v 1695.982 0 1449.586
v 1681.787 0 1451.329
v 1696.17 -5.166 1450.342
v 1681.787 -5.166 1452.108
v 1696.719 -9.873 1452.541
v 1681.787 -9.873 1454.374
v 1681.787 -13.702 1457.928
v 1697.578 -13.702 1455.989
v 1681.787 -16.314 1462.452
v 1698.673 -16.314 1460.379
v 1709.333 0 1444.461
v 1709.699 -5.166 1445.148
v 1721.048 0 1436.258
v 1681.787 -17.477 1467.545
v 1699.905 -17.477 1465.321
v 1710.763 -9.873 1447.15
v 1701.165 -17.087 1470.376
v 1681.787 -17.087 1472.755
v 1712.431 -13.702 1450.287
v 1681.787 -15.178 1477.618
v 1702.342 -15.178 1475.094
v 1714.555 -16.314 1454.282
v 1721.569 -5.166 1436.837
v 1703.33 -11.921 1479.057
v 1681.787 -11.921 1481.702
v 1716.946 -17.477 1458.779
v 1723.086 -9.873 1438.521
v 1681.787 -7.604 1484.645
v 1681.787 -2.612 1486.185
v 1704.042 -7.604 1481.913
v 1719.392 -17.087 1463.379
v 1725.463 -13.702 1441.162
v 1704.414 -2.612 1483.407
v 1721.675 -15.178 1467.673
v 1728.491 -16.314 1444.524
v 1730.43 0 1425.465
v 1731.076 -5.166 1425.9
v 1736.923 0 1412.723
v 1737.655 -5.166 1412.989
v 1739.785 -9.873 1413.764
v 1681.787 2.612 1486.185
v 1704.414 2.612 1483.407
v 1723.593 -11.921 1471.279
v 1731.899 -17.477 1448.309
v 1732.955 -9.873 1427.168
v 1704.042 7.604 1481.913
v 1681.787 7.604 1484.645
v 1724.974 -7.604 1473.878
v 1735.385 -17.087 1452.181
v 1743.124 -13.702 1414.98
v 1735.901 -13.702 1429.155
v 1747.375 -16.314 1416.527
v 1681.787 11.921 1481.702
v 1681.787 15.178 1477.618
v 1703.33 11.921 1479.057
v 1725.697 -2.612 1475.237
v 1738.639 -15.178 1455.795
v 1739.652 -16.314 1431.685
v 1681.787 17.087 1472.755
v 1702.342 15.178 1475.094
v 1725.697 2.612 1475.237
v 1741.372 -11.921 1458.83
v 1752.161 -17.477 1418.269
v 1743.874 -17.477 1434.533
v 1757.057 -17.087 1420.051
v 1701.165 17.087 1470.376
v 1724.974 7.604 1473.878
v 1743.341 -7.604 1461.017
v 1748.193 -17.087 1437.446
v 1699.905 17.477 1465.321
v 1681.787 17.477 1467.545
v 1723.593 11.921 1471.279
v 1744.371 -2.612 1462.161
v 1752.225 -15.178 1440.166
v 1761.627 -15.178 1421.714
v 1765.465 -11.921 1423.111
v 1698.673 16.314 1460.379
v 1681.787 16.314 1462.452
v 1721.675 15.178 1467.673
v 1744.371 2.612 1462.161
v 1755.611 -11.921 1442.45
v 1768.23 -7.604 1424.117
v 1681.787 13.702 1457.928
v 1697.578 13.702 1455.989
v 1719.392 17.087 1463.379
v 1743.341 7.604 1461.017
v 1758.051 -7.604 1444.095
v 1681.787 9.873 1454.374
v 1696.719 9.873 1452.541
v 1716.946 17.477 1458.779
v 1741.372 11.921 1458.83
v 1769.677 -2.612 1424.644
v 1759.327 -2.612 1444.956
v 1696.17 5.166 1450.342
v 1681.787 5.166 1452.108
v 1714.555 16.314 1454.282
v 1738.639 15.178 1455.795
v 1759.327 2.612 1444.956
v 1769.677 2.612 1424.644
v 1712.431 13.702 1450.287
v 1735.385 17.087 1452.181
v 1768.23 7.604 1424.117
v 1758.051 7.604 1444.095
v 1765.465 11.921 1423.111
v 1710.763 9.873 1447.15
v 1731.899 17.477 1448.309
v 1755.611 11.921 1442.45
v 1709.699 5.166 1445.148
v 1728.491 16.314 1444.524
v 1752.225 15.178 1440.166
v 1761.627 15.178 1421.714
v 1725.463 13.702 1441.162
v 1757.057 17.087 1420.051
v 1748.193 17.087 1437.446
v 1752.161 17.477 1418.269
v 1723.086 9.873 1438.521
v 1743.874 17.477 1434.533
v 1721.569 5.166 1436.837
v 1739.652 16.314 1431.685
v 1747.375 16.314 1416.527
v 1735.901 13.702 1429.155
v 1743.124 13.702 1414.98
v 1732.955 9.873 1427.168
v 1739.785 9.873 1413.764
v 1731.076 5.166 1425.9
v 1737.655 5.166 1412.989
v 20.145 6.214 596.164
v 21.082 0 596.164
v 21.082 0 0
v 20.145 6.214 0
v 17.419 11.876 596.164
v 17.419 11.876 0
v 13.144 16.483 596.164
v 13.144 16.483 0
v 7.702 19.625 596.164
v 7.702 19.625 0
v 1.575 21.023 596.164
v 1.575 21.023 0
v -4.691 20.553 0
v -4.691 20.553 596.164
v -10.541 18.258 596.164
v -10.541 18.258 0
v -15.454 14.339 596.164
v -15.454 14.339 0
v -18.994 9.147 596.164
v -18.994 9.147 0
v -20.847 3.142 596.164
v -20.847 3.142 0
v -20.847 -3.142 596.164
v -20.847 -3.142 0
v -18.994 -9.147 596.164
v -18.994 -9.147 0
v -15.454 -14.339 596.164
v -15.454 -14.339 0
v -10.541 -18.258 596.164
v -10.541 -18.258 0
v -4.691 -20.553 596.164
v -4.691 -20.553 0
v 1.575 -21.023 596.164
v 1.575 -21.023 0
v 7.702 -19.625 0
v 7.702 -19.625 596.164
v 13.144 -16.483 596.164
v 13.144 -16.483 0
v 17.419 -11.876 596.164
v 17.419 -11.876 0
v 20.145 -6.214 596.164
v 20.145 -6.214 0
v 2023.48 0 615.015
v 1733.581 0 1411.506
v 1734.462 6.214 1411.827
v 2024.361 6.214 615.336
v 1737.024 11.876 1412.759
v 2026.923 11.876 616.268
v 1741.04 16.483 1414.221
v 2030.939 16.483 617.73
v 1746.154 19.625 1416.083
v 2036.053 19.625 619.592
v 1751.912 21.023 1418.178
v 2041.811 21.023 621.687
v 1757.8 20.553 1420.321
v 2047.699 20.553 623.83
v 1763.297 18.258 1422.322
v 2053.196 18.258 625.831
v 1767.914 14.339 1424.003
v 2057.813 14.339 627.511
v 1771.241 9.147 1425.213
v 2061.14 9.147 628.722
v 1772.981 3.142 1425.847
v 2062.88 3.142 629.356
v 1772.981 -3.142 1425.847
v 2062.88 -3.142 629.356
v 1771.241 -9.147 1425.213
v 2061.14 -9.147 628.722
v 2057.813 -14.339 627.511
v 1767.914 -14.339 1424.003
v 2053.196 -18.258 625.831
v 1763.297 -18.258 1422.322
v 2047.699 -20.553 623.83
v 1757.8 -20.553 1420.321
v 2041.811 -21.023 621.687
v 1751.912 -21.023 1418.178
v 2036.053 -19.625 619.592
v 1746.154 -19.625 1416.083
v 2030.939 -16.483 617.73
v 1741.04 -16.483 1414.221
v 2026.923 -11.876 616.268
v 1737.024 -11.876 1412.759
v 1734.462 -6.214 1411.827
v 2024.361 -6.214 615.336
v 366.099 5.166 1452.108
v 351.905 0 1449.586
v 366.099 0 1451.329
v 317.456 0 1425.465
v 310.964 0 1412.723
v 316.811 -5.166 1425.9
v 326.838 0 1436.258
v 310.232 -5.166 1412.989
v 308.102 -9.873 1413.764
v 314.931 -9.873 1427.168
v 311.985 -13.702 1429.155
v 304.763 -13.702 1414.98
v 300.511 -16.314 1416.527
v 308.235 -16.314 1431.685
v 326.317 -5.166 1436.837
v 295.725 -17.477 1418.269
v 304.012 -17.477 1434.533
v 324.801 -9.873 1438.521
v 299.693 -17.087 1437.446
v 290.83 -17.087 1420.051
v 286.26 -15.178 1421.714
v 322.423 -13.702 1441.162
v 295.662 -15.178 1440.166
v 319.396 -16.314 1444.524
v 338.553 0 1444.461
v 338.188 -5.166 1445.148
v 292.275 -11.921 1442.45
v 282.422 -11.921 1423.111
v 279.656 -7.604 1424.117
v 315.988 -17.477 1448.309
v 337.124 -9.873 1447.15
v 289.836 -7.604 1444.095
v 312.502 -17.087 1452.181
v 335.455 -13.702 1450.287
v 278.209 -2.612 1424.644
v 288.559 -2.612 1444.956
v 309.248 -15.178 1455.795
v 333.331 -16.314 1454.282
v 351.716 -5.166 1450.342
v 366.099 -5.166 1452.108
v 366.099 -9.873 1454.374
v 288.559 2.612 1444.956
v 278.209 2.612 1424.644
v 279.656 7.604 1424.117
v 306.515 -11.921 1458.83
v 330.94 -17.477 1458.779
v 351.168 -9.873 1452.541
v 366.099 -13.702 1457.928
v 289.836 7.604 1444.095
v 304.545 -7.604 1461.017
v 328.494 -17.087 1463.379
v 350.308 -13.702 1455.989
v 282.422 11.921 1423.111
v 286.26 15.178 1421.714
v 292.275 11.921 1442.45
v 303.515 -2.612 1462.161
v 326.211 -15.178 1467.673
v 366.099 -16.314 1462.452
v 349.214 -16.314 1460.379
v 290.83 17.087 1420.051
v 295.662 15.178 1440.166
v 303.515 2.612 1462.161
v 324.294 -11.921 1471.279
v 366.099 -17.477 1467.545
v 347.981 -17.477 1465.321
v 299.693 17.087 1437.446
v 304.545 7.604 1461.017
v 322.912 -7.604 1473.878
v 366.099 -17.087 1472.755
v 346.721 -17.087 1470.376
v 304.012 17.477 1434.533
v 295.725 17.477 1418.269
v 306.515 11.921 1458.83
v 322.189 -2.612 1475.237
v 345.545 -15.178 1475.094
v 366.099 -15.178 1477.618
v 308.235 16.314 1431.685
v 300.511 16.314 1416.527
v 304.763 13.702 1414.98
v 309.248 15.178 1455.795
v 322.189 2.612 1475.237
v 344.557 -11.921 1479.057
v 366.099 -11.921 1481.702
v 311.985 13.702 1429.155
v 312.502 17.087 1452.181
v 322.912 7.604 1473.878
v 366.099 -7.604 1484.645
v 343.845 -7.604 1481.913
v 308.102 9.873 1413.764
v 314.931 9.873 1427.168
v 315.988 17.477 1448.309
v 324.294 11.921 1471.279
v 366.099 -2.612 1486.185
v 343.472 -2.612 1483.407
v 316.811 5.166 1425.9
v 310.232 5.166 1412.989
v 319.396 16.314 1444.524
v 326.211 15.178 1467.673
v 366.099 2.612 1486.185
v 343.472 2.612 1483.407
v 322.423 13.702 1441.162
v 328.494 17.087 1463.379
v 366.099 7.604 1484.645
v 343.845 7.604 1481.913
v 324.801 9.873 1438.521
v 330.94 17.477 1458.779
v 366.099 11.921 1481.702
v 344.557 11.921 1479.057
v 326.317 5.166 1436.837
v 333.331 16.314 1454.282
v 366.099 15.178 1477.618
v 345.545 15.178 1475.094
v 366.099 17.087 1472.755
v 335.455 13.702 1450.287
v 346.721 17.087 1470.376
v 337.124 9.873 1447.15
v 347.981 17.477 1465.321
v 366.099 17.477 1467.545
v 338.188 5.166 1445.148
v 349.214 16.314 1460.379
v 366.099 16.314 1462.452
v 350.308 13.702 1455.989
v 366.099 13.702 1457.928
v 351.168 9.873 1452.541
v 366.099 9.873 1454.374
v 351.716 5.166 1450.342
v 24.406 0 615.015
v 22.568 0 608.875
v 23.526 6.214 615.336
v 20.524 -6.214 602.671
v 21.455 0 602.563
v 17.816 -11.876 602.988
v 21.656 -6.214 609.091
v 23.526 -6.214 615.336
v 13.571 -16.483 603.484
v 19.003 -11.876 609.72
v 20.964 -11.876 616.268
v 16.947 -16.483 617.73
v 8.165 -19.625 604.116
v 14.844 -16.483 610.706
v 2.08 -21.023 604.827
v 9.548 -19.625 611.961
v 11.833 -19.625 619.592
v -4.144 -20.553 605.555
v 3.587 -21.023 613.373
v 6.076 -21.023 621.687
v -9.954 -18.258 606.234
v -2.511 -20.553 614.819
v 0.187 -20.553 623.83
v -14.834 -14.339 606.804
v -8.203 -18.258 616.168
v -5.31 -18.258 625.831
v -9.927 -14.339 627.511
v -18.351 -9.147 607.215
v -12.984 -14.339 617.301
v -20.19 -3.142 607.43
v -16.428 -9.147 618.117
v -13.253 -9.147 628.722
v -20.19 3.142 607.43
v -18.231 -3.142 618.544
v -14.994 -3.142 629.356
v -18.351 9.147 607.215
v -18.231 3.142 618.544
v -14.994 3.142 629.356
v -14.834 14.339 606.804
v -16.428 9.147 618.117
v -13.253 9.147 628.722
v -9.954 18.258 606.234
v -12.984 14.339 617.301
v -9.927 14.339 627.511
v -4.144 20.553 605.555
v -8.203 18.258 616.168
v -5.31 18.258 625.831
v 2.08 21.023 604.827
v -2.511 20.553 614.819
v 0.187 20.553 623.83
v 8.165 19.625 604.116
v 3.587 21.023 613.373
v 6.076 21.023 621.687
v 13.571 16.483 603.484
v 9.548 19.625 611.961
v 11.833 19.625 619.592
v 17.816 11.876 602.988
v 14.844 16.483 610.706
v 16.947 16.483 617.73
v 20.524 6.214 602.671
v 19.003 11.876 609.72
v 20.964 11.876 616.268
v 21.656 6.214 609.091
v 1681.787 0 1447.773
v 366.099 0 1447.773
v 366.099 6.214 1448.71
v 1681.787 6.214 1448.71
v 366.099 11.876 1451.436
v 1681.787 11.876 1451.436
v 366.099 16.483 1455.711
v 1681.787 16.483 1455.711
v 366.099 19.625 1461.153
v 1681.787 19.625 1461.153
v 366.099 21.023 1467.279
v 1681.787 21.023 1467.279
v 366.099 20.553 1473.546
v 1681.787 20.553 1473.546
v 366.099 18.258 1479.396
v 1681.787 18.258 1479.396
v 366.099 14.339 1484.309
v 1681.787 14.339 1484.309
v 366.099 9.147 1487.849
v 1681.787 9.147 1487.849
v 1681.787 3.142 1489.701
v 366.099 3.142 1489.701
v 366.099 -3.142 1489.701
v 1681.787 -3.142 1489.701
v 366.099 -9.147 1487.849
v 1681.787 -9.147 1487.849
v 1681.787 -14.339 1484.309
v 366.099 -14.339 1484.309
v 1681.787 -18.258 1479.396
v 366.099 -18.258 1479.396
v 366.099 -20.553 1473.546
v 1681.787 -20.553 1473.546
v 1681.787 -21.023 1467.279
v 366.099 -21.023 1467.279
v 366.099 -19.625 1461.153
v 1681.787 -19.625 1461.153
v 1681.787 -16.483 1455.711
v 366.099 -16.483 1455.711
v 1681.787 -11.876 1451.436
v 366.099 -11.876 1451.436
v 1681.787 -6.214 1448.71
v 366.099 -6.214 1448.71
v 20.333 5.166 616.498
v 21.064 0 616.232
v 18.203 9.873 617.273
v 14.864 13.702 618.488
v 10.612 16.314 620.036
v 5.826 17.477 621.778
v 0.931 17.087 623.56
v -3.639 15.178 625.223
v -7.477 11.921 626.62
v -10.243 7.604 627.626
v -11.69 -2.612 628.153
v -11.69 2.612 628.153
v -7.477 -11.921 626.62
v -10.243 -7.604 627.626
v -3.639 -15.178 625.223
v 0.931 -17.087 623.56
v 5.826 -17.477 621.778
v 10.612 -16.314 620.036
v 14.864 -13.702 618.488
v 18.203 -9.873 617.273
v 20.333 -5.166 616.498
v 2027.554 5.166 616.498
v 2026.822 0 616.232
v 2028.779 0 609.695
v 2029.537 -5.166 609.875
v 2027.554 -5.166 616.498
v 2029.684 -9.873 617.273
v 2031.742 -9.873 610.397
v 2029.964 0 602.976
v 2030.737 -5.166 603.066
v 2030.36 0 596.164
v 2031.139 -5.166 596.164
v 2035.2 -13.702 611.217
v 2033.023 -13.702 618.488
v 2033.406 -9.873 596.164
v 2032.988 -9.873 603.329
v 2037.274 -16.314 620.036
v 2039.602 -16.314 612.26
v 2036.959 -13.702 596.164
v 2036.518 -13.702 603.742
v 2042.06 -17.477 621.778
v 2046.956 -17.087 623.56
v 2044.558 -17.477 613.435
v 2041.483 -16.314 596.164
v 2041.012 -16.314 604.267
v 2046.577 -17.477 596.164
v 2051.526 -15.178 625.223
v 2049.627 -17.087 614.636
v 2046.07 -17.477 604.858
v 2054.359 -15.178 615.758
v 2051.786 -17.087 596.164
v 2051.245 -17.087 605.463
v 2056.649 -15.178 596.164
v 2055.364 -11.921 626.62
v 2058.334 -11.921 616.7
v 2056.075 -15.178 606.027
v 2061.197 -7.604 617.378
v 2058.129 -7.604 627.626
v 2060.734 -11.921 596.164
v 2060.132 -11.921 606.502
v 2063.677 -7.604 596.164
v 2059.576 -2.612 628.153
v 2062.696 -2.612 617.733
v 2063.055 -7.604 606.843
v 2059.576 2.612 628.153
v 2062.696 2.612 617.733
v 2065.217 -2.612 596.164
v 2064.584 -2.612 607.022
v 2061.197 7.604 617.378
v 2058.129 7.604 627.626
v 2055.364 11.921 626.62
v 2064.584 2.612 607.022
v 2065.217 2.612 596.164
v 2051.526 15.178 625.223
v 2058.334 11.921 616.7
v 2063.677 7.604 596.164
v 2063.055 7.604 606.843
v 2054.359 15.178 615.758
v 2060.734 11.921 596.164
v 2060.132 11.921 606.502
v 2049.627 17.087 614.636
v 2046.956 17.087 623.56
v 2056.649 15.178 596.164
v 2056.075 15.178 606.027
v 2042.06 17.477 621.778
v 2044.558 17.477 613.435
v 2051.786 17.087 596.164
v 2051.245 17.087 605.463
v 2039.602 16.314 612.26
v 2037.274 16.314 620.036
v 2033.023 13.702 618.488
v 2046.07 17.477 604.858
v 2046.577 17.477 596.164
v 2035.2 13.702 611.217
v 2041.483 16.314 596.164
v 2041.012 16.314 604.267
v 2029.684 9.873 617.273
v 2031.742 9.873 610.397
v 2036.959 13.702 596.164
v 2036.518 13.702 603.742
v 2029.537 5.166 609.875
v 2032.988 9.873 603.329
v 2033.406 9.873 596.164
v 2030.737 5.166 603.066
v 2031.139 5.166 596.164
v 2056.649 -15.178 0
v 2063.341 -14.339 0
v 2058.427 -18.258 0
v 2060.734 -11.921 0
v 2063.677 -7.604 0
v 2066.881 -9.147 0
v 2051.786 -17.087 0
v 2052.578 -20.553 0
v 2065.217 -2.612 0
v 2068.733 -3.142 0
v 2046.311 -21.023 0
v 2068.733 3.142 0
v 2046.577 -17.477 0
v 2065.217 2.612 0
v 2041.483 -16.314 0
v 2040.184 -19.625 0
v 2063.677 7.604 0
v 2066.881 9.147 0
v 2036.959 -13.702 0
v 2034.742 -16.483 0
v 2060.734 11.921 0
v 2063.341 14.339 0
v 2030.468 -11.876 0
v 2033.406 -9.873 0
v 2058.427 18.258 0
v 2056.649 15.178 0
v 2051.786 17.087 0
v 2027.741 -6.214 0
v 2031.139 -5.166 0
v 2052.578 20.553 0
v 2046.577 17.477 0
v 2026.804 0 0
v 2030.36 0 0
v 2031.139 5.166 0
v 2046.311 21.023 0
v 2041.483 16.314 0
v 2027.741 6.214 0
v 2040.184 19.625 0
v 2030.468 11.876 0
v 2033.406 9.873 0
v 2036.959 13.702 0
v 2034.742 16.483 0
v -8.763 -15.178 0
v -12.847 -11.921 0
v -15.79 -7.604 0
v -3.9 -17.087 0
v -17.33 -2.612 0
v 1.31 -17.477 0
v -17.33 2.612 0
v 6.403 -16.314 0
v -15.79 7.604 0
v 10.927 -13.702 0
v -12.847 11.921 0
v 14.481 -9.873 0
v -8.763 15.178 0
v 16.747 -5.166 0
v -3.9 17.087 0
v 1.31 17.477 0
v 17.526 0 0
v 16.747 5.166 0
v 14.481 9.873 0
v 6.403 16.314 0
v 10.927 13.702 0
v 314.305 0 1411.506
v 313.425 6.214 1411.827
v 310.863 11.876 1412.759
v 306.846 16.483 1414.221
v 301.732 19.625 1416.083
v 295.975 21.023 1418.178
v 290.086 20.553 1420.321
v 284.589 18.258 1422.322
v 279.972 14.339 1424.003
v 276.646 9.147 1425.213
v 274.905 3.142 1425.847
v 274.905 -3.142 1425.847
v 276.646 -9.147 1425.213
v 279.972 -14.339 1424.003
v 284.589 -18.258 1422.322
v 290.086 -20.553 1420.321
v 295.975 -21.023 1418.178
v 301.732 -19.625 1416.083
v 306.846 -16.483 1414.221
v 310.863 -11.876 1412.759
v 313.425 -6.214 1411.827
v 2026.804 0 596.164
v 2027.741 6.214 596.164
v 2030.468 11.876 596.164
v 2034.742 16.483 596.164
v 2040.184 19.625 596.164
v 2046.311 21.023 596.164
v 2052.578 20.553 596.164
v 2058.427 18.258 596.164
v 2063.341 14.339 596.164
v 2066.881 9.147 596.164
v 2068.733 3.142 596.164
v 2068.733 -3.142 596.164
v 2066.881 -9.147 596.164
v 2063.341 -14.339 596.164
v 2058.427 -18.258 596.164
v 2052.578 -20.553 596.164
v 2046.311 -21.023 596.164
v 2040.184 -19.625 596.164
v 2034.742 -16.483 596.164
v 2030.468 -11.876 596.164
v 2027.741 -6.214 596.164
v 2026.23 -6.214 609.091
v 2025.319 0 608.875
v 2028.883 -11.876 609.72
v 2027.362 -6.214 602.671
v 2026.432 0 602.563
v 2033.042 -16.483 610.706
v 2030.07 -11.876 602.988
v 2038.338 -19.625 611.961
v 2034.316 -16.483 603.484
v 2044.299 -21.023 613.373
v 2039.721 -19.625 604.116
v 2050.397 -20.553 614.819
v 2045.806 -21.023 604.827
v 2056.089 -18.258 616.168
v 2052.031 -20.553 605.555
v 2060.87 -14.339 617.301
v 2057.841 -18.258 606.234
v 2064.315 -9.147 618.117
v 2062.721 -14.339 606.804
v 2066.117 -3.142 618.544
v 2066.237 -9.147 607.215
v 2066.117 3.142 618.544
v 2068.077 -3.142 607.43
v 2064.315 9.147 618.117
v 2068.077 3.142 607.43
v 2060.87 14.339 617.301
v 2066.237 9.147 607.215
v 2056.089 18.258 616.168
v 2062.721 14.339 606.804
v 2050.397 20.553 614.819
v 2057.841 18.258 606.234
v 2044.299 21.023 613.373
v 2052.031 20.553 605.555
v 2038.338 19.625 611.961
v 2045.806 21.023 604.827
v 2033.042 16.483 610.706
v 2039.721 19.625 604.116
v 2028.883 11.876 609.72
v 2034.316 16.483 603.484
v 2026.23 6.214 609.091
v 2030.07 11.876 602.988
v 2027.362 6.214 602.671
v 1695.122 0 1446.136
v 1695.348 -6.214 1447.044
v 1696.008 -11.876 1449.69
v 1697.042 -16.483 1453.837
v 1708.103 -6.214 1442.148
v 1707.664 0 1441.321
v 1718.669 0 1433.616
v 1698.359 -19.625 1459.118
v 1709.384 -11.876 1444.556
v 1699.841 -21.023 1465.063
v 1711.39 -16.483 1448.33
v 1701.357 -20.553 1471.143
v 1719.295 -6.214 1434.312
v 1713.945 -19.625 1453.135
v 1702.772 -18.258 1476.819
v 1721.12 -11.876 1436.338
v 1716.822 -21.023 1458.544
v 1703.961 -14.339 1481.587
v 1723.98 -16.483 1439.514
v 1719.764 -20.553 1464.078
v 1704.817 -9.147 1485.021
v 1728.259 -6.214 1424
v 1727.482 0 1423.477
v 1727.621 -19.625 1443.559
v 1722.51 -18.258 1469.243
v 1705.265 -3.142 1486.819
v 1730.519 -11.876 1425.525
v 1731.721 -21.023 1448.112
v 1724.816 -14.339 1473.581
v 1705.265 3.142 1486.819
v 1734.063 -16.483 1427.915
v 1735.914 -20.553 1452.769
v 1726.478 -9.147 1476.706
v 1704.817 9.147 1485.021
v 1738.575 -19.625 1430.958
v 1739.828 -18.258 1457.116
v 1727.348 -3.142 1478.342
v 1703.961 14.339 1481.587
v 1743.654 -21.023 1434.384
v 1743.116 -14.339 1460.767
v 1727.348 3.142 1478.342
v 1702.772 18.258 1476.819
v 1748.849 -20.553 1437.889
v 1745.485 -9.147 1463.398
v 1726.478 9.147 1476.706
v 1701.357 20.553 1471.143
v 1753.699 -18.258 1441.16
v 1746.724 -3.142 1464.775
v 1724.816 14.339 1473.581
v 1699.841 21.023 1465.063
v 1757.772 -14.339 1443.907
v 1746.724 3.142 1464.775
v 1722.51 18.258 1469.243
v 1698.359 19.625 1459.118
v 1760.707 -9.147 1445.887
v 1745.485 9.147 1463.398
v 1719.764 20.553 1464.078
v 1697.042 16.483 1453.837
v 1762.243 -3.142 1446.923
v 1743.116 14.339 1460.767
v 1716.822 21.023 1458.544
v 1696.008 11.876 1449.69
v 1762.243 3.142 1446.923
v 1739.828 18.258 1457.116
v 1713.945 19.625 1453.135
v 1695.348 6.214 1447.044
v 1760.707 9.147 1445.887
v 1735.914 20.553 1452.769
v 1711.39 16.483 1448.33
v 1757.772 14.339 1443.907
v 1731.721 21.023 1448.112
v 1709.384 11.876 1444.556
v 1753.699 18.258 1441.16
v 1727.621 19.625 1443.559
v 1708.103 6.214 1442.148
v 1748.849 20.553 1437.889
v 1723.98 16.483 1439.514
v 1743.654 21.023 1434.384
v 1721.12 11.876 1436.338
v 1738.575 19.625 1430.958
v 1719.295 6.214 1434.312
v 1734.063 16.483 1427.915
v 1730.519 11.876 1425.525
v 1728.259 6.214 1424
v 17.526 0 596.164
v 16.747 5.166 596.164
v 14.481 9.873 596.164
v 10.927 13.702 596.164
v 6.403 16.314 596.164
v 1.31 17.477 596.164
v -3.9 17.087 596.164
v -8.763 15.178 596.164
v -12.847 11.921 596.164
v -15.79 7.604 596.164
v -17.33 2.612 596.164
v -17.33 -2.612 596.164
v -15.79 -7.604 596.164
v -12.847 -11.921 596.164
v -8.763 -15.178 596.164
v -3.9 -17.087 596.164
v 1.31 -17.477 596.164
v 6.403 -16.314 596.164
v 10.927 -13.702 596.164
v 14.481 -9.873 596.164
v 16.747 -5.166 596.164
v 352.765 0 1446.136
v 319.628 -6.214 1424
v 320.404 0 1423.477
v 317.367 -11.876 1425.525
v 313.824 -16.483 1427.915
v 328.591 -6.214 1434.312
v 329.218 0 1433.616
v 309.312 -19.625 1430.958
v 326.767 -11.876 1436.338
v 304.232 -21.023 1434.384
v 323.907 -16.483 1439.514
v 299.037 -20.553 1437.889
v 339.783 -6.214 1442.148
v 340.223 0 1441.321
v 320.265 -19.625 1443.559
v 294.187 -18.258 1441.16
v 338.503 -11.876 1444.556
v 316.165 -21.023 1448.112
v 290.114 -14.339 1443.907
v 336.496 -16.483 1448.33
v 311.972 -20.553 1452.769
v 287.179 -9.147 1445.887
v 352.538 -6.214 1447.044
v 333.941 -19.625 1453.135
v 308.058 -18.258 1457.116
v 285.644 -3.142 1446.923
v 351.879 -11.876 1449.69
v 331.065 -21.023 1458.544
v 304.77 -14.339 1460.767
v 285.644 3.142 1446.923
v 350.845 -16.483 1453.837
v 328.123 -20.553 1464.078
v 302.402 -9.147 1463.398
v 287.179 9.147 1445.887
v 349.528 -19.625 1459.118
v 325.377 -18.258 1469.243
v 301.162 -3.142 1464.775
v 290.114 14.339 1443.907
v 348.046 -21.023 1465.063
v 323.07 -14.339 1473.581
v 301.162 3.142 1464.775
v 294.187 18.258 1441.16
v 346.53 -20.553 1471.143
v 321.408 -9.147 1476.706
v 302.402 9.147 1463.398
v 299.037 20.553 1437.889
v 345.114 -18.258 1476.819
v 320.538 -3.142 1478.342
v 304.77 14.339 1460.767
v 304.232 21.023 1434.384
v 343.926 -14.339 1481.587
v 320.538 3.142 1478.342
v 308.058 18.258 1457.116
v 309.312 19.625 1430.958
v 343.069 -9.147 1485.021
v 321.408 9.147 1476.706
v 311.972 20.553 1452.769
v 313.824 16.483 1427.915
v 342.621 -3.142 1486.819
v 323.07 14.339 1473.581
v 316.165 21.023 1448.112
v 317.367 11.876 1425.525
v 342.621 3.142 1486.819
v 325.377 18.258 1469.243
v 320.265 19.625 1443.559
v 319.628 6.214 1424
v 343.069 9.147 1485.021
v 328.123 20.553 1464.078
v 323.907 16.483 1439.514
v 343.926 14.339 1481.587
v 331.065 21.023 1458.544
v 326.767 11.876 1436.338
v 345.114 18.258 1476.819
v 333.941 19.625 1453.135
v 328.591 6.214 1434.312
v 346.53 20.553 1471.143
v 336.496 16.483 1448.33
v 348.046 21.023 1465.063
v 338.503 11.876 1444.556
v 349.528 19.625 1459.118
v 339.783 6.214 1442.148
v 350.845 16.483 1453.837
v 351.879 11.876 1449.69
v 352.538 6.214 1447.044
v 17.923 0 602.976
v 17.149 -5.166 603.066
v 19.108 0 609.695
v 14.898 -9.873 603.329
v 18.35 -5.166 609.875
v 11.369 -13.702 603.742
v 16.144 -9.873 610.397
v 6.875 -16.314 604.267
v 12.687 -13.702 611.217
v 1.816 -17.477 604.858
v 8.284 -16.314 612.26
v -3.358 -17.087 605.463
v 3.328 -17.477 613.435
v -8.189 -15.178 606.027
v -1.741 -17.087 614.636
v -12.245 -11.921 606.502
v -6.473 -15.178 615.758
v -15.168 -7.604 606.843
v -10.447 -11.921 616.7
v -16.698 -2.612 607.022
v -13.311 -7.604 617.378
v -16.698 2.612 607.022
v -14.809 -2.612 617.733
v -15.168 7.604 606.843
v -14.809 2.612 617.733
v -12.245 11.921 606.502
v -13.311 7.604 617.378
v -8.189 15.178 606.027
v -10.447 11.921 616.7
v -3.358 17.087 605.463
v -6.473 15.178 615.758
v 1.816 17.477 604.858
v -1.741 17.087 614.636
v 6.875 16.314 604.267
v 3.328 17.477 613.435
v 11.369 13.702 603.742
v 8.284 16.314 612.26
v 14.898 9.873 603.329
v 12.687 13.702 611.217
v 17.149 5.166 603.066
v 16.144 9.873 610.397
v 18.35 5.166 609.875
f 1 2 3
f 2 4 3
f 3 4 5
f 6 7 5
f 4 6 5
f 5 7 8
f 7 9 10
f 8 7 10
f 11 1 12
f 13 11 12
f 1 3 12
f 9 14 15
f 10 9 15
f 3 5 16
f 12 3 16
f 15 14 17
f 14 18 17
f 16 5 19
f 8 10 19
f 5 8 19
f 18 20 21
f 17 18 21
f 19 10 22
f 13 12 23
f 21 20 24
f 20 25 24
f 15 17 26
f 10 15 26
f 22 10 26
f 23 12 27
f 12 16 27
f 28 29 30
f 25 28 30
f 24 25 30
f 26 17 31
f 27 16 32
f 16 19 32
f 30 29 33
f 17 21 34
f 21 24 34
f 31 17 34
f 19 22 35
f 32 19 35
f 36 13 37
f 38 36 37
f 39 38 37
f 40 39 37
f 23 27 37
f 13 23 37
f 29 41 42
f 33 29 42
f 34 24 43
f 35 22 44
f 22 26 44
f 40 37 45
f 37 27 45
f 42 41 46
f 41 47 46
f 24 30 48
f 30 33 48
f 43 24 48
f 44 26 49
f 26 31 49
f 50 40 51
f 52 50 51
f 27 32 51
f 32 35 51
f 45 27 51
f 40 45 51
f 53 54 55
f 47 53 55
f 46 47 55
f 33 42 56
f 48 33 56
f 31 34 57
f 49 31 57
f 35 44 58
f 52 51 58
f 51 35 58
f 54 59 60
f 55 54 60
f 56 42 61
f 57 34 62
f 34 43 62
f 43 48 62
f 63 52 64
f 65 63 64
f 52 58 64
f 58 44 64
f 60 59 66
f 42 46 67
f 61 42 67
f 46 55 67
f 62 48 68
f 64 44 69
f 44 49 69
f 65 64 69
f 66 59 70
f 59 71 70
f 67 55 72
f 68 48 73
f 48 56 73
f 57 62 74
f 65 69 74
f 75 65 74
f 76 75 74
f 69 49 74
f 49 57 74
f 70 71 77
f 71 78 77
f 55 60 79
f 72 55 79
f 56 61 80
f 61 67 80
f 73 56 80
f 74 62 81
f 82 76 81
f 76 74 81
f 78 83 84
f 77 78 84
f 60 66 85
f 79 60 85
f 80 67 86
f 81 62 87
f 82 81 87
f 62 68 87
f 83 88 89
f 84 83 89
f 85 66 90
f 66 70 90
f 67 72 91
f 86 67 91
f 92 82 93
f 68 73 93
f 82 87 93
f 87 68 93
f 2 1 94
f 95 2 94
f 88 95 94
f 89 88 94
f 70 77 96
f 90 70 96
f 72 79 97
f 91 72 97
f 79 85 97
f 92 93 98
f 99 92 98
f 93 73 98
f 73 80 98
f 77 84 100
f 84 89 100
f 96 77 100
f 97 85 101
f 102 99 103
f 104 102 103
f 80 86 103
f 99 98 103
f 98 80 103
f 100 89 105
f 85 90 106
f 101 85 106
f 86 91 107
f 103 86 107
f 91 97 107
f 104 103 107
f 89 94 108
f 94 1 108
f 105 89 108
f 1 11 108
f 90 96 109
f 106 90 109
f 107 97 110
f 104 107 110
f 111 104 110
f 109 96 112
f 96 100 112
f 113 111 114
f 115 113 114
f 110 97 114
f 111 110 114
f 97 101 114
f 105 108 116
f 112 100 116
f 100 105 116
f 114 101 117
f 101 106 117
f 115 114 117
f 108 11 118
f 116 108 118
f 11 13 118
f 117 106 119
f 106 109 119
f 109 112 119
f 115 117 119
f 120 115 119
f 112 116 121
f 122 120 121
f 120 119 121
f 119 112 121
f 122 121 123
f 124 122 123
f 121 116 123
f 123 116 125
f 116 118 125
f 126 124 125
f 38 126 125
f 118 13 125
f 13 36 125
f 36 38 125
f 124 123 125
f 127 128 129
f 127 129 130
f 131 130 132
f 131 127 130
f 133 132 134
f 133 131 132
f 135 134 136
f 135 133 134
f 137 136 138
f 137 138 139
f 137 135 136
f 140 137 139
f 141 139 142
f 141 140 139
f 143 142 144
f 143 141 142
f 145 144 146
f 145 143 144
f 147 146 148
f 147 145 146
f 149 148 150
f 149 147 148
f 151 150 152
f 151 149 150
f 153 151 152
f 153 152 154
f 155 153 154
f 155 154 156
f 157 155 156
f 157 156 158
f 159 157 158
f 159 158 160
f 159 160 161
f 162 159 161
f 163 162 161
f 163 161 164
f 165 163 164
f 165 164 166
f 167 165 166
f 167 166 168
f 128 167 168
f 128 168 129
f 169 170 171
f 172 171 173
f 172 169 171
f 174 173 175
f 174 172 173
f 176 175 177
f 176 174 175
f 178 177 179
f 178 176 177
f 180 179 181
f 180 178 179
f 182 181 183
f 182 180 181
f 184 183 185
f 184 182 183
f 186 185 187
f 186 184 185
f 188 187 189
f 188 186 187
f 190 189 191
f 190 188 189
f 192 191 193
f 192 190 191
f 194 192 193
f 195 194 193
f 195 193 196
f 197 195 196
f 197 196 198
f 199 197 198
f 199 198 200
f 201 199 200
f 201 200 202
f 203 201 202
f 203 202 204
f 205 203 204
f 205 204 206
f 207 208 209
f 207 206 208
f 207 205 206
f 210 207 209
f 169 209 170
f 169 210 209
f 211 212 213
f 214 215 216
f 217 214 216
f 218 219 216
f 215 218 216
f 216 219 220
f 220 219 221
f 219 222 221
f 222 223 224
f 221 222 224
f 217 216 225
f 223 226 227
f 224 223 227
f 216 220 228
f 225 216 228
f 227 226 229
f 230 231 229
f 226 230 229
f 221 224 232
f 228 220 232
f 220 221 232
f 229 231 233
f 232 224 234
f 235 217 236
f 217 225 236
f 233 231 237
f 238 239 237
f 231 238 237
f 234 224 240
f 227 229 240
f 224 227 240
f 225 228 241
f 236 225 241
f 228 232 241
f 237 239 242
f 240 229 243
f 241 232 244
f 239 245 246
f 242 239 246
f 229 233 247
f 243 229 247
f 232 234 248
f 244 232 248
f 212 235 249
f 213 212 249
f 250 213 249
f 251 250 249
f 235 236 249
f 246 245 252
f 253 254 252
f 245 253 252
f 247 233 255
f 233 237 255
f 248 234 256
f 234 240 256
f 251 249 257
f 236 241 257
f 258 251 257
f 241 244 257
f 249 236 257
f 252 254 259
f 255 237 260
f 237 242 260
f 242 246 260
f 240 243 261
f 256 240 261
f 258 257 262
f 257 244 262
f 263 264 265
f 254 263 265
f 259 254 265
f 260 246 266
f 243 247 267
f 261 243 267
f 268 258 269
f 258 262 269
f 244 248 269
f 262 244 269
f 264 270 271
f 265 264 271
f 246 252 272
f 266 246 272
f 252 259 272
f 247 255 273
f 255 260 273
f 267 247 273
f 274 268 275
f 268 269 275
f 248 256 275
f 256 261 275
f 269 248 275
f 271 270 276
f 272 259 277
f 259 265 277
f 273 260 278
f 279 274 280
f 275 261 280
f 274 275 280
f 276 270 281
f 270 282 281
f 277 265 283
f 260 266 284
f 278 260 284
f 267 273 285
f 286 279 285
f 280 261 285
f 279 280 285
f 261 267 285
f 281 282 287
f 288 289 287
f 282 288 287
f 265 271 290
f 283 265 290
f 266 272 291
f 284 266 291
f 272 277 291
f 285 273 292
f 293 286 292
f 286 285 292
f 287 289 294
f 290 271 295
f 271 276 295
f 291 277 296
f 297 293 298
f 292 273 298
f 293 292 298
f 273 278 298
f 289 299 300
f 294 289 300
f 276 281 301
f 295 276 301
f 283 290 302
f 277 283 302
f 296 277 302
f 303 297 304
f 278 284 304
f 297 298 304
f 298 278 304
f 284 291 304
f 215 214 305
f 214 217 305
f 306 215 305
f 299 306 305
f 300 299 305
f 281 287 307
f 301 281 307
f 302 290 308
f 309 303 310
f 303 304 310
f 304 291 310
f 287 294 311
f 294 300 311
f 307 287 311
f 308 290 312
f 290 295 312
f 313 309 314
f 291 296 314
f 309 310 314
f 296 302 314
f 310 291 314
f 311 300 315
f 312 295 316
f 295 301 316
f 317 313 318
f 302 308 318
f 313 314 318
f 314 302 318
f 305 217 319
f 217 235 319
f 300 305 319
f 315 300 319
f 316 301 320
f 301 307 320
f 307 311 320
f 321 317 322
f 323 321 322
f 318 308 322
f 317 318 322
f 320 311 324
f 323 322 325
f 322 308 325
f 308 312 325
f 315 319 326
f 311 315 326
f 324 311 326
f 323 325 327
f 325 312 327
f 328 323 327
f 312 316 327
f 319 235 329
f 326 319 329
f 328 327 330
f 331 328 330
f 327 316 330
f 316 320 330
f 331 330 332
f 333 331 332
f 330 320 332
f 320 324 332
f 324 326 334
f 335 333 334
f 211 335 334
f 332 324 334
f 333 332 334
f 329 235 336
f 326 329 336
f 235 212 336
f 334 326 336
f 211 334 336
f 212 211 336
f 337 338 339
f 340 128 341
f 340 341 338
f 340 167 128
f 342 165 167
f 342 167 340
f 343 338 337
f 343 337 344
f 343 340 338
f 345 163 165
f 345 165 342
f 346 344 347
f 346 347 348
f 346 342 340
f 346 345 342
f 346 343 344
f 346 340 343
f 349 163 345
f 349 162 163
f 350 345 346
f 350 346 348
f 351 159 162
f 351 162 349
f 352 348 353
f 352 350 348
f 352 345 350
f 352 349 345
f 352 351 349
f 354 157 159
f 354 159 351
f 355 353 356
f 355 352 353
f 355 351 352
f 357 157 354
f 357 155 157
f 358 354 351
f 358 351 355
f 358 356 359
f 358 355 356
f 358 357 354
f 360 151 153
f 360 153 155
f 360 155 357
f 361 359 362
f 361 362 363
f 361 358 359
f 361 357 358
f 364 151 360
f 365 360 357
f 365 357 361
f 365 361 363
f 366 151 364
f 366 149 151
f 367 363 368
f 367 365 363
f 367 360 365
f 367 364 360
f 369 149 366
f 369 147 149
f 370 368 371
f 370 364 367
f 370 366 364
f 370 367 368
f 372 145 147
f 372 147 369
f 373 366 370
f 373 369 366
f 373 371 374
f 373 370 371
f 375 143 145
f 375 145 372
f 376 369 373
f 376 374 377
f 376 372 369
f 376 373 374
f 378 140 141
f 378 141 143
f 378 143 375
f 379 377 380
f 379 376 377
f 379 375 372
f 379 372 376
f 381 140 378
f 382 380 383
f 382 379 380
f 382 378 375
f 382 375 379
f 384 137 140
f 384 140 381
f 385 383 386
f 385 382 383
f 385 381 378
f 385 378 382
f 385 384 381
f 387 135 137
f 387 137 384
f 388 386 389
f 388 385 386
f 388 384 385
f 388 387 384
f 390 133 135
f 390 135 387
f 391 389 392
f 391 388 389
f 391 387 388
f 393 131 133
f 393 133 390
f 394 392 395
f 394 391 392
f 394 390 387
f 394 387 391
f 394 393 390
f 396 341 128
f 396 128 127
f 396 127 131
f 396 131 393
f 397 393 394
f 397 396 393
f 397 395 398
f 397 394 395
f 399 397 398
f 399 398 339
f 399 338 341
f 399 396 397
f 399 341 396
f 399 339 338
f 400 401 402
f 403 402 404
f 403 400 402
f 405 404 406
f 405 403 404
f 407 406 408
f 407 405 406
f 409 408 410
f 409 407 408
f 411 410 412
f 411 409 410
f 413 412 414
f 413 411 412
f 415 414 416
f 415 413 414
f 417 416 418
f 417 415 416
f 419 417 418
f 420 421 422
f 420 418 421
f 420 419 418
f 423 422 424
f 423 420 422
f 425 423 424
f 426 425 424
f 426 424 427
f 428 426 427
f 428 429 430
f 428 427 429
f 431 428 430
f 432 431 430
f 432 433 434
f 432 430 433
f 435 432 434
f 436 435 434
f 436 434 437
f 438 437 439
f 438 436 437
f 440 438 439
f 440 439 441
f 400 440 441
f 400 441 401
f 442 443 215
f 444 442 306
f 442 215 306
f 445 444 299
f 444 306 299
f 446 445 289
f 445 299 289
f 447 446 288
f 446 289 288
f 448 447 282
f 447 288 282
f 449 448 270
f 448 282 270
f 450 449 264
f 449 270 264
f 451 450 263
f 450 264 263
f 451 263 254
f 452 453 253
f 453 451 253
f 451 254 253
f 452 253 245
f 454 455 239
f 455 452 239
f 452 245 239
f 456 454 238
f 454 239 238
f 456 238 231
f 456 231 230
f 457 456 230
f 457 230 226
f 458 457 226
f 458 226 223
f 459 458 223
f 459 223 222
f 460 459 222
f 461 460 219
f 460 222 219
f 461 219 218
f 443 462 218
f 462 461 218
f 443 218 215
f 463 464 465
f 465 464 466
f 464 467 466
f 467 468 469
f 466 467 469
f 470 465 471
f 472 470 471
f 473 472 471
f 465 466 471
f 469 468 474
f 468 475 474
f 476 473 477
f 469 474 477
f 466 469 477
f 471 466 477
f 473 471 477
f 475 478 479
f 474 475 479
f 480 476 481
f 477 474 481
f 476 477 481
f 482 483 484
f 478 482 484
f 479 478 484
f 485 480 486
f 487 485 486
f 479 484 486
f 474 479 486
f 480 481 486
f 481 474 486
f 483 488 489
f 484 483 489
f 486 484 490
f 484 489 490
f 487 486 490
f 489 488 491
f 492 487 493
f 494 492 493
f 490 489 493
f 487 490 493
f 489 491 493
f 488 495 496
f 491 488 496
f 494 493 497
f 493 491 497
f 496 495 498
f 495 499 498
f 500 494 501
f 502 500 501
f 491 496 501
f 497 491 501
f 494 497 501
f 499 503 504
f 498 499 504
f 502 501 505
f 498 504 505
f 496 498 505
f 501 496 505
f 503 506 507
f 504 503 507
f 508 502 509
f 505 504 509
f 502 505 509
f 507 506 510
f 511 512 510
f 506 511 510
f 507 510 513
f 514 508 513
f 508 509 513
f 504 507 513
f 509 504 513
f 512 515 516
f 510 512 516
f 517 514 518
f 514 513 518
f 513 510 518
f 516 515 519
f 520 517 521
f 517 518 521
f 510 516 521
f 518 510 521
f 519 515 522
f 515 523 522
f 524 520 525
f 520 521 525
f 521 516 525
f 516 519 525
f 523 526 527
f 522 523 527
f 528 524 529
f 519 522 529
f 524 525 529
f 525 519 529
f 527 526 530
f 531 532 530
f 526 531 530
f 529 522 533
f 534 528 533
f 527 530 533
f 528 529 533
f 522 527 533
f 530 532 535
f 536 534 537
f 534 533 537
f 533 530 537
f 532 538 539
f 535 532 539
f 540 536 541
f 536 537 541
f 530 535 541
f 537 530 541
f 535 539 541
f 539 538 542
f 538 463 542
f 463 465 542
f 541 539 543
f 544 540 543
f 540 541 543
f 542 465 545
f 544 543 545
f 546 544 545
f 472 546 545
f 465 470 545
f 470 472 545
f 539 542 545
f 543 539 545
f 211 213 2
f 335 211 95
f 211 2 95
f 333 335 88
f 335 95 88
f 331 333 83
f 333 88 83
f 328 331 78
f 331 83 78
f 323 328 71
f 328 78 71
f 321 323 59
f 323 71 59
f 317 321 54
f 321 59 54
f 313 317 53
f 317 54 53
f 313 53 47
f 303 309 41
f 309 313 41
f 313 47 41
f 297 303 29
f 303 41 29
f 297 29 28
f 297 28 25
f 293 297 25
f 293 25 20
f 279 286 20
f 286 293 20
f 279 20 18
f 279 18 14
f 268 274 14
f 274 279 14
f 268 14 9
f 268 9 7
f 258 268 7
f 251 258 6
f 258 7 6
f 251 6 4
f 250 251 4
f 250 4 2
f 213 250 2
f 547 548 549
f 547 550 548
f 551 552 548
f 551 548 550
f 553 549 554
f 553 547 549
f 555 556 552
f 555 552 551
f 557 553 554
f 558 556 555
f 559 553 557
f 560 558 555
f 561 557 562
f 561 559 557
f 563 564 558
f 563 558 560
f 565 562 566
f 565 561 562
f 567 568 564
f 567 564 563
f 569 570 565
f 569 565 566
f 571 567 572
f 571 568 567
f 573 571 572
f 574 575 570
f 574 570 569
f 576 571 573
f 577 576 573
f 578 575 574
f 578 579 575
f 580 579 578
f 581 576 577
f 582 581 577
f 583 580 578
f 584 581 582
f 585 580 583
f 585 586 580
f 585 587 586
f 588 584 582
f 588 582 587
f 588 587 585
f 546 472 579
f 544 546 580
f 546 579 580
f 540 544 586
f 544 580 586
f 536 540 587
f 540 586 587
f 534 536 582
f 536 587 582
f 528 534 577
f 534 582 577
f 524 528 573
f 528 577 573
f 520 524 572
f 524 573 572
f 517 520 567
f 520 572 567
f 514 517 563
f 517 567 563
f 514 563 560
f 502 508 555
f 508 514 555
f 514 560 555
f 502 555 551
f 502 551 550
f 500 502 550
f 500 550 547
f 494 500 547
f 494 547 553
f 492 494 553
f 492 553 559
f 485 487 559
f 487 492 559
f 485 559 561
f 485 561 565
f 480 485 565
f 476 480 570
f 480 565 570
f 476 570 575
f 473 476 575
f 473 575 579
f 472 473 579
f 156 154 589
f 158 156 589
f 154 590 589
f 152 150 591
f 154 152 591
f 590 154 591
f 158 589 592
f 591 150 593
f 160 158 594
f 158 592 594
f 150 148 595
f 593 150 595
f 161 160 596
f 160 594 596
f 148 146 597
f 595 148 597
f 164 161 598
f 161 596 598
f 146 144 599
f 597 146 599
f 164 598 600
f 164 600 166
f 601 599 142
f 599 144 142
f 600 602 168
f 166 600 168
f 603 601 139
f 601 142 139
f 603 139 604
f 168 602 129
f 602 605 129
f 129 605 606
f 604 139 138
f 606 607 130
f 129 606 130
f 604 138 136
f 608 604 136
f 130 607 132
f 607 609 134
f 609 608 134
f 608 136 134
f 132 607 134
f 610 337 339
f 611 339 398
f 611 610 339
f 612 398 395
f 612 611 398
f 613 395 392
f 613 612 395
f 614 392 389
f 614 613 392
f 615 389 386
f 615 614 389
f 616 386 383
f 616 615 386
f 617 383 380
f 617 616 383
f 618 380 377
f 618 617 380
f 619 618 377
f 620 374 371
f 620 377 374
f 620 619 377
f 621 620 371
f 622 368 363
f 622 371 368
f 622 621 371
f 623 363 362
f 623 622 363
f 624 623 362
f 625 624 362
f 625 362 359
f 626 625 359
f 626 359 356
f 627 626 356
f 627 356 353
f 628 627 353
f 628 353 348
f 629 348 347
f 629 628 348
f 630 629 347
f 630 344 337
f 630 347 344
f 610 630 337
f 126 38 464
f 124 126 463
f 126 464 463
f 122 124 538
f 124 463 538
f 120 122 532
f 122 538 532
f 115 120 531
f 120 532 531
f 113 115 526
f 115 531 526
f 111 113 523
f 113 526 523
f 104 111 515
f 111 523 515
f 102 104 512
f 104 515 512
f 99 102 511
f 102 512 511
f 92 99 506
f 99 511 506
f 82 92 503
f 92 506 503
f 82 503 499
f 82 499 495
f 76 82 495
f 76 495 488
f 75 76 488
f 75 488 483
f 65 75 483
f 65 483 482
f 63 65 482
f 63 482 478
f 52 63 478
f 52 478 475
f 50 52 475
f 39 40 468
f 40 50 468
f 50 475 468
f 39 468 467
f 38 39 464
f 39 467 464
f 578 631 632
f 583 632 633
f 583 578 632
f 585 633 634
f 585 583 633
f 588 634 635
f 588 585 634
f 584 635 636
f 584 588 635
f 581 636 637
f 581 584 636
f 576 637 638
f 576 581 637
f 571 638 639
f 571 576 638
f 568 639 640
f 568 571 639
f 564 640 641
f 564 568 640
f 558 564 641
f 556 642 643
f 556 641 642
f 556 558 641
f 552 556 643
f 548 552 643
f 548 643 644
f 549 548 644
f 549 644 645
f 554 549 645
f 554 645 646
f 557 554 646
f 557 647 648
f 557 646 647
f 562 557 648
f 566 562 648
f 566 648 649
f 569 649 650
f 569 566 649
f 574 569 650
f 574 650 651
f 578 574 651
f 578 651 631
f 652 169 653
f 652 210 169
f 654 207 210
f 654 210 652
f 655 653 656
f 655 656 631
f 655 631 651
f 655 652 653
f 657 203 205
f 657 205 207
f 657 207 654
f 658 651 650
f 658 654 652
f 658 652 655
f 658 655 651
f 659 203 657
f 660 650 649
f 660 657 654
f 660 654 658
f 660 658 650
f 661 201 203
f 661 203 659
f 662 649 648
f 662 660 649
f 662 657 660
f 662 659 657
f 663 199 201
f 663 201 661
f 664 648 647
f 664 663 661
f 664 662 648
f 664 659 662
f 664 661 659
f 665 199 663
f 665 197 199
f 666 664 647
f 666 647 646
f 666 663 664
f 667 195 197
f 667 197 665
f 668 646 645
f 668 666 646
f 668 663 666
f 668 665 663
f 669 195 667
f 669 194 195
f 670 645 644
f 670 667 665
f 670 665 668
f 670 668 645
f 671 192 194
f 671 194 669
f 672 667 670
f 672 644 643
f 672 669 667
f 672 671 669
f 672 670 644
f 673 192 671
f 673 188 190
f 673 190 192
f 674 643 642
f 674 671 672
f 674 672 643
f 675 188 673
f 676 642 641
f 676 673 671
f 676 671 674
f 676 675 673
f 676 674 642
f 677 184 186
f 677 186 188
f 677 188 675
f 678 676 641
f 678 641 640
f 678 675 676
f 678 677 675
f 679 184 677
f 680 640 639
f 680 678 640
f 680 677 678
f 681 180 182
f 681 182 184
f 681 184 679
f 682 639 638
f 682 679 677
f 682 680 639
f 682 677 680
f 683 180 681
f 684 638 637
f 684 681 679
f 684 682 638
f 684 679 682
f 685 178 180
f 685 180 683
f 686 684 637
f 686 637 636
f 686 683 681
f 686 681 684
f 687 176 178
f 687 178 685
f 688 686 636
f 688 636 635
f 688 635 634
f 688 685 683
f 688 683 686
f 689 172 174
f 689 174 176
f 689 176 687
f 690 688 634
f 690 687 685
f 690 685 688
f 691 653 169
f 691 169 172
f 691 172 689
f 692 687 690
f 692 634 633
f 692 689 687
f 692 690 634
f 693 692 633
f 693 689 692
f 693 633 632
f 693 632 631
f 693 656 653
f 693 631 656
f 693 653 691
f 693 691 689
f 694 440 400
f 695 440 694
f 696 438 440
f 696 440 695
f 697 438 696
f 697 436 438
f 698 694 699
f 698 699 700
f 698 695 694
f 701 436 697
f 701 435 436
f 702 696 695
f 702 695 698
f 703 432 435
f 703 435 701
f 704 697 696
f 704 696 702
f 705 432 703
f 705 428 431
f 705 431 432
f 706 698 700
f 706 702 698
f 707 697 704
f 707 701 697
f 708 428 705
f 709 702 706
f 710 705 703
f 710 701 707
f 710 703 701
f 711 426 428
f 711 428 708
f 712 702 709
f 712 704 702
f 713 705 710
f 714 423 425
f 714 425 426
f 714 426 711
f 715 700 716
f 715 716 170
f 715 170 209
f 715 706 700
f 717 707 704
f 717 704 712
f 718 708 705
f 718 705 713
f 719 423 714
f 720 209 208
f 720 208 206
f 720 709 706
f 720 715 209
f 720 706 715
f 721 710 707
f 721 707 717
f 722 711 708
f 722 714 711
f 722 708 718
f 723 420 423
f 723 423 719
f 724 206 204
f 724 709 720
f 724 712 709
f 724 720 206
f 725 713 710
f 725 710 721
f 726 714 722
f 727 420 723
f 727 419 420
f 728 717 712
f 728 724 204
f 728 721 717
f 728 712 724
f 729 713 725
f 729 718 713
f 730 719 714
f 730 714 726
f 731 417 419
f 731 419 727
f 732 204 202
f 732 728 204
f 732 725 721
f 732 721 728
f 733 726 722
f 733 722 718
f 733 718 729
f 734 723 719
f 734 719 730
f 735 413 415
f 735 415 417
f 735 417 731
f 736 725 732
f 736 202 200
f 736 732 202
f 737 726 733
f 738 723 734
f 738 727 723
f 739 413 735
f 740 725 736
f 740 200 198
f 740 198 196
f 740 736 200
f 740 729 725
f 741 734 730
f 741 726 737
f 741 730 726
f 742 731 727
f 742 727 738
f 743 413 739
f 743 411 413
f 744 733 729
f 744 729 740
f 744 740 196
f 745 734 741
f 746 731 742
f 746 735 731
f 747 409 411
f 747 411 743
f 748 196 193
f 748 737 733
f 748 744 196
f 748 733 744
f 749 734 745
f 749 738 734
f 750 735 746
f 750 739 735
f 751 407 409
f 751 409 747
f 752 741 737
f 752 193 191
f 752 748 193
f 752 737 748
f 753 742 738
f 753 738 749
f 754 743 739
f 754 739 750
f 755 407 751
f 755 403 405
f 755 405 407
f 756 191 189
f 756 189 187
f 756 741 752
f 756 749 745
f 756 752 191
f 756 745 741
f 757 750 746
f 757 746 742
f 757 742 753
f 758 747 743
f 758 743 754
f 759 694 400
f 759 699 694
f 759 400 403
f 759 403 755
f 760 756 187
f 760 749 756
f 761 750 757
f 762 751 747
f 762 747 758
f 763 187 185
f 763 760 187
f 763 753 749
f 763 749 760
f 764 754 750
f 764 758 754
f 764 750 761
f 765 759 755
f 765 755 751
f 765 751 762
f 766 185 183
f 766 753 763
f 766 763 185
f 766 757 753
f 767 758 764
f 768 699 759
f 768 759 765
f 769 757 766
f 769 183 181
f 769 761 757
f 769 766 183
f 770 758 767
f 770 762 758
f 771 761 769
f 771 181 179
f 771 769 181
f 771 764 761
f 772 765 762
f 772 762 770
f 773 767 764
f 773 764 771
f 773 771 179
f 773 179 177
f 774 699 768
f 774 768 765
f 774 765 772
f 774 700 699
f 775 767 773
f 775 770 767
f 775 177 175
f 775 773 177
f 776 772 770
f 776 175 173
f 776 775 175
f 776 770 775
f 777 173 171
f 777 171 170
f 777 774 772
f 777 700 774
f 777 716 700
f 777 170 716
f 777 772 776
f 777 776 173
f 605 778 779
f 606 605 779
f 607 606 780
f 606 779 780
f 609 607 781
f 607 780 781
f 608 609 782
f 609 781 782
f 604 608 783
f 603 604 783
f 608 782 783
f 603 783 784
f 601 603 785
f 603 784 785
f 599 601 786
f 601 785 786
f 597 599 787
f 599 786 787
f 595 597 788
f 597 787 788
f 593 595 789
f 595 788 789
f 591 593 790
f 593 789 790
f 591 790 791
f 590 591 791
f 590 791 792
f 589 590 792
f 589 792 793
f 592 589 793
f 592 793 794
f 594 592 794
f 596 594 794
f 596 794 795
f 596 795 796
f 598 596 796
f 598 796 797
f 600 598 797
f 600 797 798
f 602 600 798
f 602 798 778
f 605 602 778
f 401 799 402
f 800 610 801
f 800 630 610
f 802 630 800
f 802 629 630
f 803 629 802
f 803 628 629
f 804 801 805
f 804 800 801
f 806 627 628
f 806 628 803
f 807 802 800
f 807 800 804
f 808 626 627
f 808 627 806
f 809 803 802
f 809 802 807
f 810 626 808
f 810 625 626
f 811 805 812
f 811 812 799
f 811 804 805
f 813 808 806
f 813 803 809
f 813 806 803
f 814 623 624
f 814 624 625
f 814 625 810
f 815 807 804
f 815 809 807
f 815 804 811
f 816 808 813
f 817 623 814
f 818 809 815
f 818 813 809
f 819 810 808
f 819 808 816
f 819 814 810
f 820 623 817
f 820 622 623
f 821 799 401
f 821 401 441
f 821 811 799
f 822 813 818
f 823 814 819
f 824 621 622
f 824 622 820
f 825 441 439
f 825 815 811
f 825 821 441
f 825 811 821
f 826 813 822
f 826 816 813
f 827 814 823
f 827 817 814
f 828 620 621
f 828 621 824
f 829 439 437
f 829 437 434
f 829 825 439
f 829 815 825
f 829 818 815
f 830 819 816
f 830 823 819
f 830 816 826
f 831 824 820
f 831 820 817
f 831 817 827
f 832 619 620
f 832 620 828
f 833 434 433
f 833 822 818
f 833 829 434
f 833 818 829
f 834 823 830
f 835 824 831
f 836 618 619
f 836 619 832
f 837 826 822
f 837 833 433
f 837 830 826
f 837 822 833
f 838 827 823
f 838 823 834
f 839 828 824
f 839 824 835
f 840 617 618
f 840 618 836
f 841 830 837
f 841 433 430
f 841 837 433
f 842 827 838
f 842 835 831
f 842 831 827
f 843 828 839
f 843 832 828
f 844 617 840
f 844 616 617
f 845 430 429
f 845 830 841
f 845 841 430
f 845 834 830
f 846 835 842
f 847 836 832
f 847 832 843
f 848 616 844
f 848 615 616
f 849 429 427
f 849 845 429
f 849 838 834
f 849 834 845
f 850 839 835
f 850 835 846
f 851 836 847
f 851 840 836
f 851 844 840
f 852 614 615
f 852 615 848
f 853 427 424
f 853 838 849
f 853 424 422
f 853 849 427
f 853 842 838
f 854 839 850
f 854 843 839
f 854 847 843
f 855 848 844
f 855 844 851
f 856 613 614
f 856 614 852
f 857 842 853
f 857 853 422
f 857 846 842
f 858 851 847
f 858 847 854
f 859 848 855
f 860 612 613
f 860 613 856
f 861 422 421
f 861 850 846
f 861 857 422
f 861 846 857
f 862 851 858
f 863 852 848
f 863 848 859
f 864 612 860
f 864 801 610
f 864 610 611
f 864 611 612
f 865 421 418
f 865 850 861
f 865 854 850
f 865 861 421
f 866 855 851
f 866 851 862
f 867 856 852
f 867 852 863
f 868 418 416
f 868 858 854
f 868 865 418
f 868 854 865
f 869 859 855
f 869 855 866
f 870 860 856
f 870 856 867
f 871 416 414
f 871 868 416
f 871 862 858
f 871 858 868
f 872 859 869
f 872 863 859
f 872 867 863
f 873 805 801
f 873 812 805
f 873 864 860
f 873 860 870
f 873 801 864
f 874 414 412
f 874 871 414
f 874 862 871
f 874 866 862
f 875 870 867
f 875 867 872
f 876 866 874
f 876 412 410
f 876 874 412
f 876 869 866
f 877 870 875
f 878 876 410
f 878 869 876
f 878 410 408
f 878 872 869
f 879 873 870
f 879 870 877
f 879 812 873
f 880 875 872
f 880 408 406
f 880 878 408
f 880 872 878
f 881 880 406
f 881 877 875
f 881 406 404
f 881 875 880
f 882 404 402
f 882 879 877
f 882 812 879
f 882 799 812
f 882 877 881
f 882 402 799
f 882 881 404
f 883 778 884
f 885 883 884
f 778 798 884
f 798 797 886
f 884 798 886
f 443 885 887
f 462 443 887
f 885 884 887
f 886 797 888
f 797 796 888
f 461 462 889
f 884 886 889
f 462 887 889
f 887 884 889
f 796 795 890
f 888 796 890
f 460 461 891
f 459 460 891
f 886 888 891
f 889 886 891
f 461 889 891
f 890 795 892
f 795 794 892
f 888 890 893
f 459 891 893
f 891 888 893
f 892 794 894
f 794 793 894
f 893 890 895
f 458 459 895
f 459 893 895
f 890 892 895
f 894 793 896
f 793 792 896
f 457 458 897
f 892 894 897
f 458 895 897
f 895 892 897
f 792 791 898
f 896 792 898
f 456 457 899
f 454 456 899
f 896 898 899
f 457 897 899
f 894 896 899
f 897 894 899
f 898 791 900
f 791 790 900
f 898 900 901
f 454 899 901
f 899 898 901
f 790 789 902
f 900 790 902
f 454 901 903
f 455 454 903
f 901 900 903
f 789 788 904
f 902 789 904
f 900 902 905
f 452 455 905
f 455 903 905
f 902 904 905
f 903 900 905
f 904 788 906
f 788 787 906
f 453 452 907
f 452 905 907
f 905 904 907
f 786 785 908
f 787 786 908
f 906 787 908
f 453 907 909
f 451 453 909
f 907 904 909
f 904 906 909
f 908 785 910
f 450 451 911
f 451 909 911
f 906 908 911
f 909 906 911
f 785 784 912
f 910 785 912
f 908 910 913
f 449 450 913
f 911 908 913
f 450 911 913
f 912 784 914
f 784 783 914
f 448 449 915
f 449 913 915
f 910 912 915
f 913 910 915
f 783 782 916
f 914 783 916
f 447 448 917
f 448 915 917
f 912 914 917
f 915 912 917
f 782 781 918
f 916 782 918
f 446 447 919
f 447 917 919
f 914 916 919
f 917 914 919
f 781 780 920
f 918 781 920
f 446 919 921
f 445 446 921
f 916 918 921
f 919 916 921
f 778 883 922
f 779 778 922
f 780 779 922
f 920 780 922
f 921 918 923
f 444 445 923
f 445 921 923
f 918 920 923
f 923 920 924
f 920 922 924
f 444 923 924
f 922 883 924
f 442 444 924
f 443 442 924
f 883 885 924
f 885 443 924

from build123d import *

# Parameters (mm, degrees)
F0_R   = 21.082
F0_R_2 = 17.526


with BuildPart() as f2:
    # F2: sweep along a path in F1
    with BuildLine(Plane.XZ) as f2_path:
        Line((0, 0), (0, 596.16388407))
        ThreePointArc((0, 596.16388407), (1.1576492205, 609.3958752082), (4.5954222961, 622.2258189914))
        Line((4.5954222961, 622.2258189914), (294.4944557647, 1418.7168673681))
        ThreePointArc((294.4944557647, 1418.7168673681), (322.3925090186, 1455.0743182215), (366.0990334686, 1468.8549324466))
        Line((366.0990334686, 1468.8549324466), (1681.7874046454, 1468.8549324466))
        ThreePointArc((1681.7874046454, 1468.8549324466), (1725.4939290954, 1455.0743182215), (1753.3919823493, 1418.7168673681))
        Line((1753.3919823493, 1418.7168673681), (2043.2910158179, 622.2258189914))
        ThreePointArc((2043.2910158179, 622.2258189914), (2046.7287888935, 609.3958752082), (2047.886438114, 596.16388407))
        Line((2047.886438114, 596.16388407), (2047.886438114, 0))
    # F0 (on Top) → F2 (sweep)
    with BuildSketch(Plane.XY):
        Circle(F0_R)
        Circle(F0_R_2, mode=Mode.SUBTRACT)
    sweep(path=f2_path.line)


solid = f2.part
